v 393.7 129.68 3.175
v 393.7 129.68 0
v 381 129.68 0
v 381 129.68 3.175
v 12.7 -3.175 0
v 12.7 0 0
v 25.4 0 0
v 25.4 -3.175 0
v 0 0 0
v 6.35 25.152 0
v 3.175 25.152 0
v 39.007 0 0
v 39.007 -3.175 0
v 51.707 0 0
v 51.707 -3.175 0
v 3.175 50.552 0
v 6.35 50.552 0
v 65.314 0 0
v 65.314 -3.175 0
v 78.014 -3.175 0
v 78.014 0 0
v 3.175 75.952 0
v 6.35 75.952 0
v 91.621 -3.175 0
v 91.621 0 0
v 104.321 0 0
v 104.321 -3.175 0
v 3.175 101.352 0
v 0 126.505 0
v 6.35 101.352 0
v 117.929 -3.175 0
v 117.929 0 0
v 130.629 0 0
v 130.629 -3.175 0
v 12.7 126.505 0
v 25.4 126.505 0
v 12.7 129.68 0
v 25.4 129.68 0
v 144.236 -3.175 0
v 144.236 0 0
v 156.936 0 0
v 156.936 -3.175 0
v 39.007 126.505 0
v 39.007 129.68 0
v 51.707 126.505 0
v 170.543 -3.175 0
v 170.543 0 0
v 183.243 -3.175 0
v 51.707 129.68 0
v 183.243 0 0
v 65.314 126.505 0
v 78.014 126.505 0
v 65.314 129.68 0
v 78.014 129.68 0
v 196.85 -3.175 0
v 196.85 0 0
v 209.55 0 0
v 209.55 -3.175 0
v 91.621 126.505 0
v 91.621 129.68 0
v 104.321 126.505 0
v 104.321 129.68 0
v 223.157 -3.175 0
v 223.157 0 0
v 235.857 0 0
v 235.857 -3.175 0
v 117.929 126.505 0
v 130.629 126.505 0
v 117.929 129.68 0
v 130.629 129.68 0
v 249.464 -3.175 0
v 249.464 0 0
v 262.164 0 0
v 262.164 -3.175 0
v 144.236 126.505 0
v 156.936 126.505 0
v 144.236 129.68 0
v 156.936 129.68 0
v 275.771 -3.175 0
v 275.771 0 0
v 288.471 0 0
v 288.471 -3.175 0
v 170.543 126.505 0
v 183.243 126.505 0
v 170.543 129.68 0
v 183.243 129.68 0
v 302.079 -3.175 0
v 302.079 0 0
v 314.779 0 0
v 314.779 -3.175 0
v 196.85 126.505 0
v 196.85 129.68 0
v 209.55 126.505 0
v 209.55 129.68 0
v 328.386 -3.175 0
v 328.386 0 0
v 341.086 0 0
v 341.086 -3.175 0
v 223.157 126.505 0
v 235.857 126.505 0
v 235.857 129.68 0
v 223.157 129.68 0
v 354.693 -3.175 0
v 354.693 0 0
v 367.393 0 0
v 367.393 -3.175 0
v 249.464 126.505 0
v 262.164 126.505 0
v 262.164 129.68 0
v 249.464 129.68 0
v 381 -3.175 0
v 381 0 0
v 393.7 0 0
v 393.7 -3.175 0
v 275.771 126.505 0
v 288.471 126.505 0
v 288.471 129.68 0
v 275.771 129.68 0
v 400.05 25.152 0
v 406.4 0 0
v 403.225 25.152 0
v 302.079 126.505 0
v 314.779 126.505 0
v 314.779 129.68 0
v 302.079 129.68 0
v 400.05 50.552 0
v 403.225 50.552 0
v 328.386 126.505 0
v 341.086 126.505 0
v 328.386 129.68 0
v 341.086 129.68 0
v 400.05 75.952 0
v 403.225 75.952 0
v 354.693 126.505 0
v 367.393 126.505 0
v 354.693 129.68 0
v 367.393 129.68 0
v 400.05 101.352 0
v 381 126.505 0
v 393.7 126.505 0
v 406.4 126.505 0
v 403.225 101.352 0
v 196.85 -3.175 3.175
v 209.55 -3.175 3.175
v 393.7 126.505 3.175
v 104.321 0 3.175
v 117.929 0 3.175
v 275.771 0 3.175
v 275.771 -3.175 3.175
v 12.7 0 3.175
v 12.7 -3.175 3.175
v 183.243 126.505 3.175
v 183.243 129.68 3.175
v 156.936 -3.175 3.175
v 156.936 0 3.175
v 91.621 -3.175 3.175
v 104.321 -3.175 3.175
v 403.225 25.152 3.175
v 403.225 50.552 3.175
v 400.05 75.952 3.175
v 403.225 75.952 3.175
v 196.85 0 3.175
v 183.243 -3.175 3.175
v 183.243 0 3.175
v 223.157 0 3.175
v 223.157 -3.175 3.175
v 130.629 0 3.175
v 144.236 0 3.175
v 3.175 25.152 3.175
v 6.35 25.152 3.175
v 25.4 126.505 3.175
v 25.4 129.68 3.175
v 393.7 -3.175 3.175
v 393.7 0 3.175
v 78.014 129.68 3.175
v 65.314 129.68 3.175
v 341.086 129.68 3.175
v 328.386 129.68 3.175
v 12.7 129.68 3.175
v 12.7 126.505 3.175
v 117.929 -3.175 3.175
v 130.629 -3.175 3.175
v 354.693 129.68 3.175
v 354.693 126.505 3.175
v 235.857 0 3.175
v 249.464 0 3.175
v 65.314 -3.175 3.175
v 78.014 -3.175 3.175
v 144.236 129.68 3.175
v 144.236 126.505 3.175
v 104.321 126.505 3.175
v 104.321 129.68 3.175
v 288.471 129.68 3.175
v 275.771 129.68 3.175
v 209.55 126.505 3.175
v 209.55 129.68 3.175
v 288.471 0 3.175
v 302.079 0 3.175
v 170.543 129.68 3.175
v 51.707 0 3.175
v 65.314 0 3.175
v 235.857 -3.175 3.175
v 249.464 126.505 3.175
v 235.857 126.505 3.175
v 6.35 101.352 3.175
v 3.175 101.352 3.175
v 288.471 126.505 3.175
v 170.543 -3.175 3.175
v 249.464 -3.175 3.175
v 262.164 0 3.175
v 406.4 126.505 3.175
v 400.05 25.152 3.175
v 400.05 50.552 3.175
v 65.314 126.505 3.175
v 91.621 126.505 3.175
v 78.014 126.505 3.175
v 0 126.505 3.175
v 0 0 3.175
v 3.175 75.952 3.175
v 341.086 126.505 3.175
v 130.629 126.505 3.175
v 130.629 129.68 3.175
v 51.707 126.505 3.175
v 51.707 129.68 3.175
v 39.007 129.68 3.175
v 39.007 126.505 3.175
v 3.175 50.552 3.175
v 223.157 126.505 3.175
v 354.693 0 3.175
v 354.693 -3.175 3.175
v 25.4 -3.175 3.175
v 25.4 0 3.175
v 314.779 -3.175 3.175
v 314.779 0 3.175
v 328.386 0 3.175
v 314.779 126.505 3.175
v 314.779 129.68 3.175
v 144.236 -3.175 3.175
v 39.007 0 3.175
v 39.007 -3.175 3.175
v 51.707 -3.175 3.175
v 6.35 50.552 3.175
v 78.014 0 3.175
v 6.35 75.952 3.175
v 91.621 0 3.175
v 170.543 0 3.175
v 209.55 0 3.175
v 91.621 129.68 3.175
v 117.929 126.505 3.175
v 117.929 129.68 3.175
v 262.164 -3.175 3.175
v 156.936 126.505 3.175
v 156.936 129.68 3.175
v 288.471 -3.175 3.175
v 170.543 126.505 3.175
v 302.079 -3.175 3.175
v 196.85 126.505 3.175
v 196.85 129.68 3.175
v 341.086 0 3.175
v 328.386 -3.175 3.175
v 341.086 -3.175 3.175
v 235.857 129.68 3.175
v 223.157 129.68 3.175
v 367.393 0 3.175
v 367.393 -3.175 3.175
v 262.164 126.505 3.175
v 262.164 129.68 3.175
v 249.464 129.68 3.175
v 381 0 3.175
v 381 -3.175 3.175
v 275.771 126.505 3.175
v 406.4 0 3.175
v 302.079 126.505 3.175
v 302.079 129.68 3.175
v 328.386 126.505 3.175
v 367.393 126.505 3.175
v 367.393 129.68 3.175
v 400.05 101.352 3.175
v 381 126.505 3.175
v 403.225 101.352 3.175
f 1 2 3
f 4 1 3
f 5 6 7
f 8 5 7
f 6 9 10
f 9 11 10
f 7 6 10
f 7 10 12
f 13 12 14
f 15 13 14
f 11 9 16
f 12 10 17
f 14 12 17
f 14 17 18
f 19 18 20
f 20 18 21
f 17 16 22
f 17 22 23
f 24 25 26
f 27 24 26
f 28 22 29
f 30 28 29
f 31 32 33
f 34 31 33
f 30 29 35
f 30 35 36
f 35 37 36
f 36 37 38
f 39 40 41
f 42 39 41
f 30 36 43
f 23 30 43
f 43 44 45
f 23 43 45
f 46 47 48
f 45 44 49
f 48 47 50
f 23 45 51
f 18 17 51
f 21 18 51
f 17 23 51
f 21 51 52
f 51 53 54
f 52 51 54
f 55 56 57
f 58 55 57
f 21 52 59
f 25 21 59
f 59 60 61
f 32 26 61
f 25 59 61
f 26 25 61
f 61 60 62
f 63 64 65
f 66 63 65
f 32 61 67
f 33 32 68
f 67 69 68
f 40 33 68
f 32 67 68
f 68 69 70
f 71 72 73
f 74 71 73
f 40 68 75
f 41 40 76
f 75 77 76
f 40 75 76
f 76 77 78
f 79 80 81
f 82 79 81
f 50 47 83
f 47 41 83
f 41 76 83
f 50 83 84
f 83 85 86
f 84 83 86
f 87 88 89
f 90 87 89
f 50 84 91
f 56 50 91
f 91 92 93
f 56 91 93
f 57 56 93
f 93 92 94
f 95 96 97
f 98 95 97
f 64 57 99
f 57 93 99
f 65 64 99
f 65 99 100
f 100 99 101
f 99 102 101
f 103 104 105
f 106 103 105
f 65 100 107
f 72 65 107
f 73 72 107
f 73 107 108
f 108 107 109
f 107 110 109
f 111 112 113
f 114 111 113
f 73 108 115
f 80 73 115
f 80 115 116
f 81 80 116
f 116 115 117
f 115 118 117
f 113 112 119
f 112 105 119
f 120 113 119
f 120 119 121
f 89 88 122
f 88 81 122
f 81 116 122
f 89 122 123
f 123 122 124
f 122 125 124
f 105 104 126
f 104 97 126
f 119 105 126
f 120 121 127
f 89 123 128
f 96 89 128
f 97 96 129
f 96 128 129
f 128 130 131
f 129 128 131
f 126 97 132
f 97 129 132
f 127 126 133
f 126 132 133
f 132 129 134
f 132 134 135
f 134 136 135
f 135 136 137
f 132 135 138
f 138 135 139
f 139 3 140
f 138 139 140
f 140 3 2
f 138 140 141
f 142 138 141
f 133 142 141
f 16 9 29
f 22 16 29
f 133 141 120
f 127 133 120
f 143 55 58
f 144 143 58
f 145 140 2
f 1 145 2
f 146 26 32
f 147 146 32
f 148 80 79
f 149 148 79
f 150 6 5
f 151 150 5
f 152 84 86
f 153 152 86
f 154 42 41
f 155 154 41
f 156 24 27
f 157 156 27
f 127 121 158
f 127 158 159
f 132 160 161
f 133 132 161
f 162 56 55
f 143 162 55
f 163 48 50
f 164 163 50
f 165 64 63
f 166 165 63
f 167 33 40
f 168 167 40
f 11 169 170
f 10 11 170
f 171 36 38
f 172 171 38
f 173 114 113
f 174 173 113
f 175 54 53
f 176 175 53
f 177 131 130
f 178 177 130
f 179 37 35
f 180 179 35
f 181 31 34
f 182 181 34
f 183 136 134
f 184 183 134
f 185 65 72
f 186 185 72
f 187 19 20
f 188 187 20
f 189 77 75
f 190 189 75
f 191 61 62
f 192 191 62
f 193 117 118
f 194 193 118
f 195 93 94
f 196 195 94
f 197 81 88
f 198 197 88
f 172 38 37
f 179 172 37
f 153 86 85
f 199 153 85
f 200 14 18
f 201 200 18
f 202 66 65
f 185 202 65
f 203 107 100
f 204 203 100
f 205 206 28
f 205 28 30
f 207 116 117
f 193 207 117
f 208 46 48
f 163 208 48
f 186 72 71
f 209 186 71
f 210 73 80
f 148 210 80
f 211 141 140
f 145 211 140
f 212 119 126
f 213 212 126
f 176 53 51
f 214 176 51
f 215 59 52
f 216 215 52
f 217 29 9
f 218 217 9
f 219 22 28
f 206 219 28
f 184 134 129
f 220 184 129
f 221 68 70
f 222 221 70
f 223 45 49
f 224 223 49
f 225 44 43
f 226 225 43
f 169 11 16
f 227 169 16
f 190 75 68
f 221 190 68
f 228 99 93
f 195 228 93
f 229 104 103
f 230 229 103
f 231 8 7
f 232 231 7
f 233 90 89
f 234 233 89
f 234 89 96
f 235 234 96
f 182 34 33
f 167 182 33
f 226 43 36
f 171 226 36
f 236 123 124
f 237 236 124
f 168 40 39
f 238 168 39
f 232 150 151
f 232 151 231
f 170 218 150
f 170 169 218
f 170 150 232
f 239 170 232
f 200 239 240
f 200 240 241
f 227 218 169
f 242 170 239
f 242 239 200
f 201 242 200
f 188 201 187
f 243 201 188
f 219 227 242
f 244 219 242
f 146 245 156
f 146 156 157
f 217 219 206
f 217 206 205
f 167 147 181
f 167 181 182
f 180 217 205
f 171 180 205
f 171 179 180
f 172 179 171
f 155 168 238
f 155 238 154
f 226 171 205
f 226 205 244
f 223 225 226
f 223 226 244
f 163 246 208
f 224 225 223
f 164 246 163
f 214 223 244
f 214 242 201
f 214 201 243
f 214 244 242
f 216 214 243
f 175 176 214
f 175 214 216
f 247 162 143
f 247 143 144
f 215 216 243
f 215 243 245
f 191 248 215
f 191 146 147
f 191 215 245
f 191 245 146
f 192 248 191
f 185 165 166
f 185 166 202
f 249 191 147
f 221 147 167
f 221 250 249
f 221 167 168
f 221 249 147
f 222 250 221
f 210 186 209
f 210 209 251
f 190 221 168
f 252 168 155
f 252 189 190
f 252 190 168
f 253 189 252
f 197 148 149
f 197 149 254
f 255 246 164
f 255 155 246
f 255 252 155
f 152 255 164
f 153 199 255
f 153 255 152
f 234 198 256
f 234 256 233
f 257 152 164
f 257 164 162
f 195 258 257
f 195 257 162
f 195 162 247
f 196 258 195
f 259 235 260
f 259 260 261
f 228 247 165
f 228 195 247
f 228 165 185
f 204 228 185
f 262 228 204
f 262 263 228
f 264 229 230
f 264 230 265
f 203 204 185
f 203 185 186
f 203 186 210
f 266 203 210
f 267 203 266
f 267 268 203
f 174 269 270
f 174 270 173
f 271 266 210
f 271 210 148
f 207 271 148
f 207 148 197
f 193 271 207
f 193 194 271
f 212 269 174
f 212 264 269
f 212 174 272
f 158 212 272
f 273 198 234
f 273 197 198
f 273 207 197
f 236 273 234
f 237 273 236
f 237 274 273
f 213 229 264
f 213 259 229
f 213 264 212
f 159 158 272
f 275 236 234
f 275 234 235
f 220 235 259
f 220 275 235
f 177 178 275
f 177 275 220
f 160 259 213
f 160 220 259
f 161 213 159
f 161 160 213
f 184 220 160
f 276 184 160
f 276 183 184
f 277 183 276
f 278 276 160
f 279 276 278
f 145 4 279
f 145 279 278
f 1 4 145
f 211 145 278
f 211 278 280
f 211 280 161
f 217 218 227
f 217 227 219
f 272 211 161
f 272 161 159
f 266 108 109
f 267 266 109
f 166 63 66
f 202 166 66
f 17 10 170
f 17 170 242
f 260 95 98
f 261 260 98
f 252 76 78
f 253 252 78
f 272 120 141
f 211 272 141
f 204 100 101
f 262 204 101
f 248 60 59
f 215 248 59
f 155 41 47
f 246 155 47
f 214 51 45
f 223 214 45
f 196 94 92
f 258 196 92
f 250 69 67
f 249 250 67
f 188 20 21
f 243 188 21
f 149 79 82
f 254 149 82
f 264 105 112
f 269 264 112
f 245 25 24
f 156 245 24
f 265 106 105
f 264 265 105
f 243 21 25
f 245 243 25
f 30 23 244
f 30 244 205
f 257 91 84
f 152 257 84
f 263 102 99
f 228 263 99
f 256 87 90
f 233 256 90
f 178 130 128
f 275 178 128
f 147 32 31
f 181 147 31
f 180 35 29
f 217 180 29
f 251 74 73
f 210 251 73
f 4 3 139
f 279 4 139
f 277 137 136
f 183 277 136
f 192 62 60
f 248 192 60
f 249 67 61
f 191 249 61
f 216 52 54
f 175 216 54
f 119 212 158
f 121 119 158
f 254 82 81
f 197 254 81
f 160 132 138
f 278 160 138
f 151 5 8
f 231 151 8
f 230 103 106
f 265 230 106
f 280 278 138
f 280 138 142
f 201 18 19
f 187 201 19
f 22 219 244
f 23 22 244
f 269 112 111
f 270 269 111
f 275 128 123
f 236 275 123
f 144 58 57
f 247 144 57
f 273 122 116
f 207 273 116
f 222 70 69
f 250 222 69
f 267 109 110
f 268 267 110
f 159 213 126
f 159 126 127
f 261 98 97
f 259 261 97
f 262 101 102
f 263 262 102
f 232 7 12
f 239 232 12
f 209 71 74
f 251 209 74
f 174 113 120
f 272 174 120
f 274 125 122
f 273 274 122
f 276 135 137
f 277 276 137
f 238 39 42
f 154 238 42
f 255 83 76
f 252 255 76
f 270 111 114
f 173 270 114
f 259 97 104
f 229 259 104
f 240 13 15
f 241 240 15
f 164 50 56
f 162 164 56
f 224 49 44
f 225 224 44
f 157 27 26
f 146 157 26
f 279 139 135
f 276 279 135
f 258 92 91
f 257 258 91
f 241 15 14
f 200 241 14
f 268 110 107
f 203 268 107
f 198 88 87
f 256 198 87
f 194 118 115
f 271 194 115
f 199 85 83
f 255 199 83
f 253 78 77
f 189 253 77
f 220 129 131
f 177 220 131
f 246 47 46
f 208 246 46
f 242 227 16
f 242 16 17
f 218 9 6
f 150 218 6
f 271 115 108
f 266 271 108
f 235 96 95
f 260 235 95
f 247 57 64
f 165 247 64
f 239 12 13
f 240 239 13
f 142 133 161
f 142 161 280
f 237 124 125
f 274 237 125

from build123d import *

# Parameters (mm, degrees)
SKETCH1_W           = 3.175
SKETCH1_H           = 25.4
BOSS_EXTRUDE1_DEPTH = 3.175


with BuildPart() as part:
    # Sketch1 → Boss-Extrude1 (new body)
    with BuildSketch(Plane.XY):
        Polygon((65.314285714, 126.5047), (65.214285714, 126.5047), (51.807142857, 126.5047), (51.707142857, 126.5047), (51.707142857, 129.6797), (39.007142857, 129.6797), (39.007142857, 126.5047), (38.907142857, 126.5047), (25.5, 126.5047), (25.4, 126.5047), (25.4, 129.6797), (12.7, 129.6797), (12.7, 126.5047), (12.6, 126.5047), (0, 126.5047), (0, 0), (12.6, 0), (12.7, 0), (12.7, -3.175), (25.4, -3.175), (25.4, 0), (25.5, 0), (38.907142857, 0), (39.007142857, 0), (39.007142857, -3.175), (51.707142857, -3.175), (51.707142857, 0), (51.807142857, 0), (65.214285714, 0), (65.314285714, 0), (65.314285714, -3.175), (78.014285714, -3.175), (78.014285714, 0), (78.114285714, 0), (91.521428571, 0), (91.621428571, 0), (91.621428571, -3.175), (104.321428571, -3.175), (104.321428571, 0), (104.421428571, 0), (117.828571429, 0), (117.928571429, 0), (117.928571429, -3.175), (130.628571429, -3.175), (130.628571429, 0), (130.728571429, 0), (144.135714286, 0), (144.235714286, 0), (144.235714286, -3.175), (156.935714286, -3.175), (156.935714286, 0), (157.035714286, 0), (170.442857143, 0), (170.542857143, 0), (170.542857143, -3.175), (183.242857143, -3.175), (183.242857143, 0), (183.342857143, 0), (196.75, 0), (196.85, 0), (196.85, -3.175), (209.55, -3.175), (209.55, 0), (209.65, 0), (223.057142857, 0), (223.157142857, 0), (223.157142857, -3.175), (235.857142857, -3.175), (235.857142857, 0), (235.957142857, 0), (249.364285714, 0), (249.464285714, 0), (249.464285714, -3.175), (262.164285714, -3.175), (262.164285714, 0), (262.264285714, 0), (275.671428571, 0), (275.771428571, 0), (275.771428571, -3.175), (288.471428571, -3.175), (288.471428571, 0), (288.571428571, 0), (301.978571429, 0), (302.078571429, 0), (302.078571429, -3.175), (314.778571429, -3.175), (314.778571429, 0), (314.878571429, 0), (328.285714286, 0), (328.385714286, 0), (328.385714286, -3.175), (341.085714286, -3.175), (341.085714286, 0), (341.185714286, 0), (354.592857143, 0), (354.692857143, 0), (354.692857143, -3.175), (367.392857143, -3.175), (367.392857143, 0), (367.492857143, 0), (380.9, 0), (381, 0), (381, -3.175), (393.7, -3.175), (393.7, 0), (393.8, 0), (406.4, 0), (406.4, 126.5047), (393.8, 126.5047), (393.7, 126.5047), (393.7, 129.6797), (381, 129.6797), (381, 126.5047), (380.9, 126.5047), (367.492857143, 126.5047), (367.392857143, 126.5047), (367.392857143, 129.6797), (354.692857143, 129.6797), (354.692857143, 126.5047), (354.592857143, 126.5047), (341.185714286, 126.5047), (341.085714286, 126.5047), (341.085714286, 129.6797), (328.385714286, 129.6797), (328.385714286, 126.5047), (328.285714286, 126.5047), (314.878571429, 126.5047), (314.778571429, 126.5047), (314.778571429, 129.6797), (302.078571429, 129.6797), (302.078571429, 126.5047), (301.978571429, 126.5047), (288.571428571, 126.5047), (288.471428571, 126.5047), (288.471428571, 129.6797), (275.771428571, 129.6797), (275.771428571, 126.5047), (275.671428571, 126.5047), (262.264285714, 126.5047), (262.164285714, 126.5047), (262.164285714, 129.6797), (249.464285714, 129.6797), (249.464285714, 126.5047), (249.364285714, 126.5047), (235.957142857, 126.5047), (235.857142857, 126.5047), (235.857142857, 129.6797), (223.157142857, 129.6797), (223.157142857, 126.5047), (223.057142857, 126.5047), (209.65, 126.5047), (209.55, 126.5047), (209.55, 129.6797), (196.85, 129.6797), (196.85, 126.5047), (196.75, 126.5047), (183.342857143, 126.5047), (183.242857143, 126.5047), (183.242857143, 129.6797), (170.542857143, 129.6797), (170.542857143, 126.5047), (170.442857143, 126.5047), (157.035714286, 126.5047), (156.935714286, 126.5047), (156.935714286, 129.6797), (144.235714286, 129.6797), (144.235714286, 126.5047), (144.135714286, 126.5047), (130.728571429, 126.5047), (130.628571429, 126.5047), (130.628571429, 129.6797), (117.928571429, 129.6797), (117.928571429, 126.5047), (117.828571429, 126.5047), (104.421428571, 126.5047), (104.321428571, 126.5047), (104.321428571, 129.6797), (91.621428571, 129.6797), (91.621428571, 126.5047), (91.521428571, 126.5047), (78.114285714, 126.5047), (78.014285714, 126.5047), (78.014285714, 129.6797), (65.314285714, 129.6797), align=None)
        with Locations((401.6375, 88.65235)):
            Rectangle(SKETCH1_W, SKETCH1_H, mode=Mode.SUBTRACT)
        with Locations((401.6375, 37.85235)):
            Rectangle(SKETCH1_W, SKETCH1_H, mode=Mode.SUBTRACT)
        with Locations((4.7625, 88.65235)):
            Rectangle(SKETCH1_W, SKETCH1_H, mode=Mode.SUBTRACT)
        with Locations((4.7625, 37.85235)):
            Rectangle(SKETCH1_W, SKETCH1_H, mode=Mode.SUBTRACT)
    extrude(amount=BOSS_EXTRUDE1_DEPTH)


solid = part.part
